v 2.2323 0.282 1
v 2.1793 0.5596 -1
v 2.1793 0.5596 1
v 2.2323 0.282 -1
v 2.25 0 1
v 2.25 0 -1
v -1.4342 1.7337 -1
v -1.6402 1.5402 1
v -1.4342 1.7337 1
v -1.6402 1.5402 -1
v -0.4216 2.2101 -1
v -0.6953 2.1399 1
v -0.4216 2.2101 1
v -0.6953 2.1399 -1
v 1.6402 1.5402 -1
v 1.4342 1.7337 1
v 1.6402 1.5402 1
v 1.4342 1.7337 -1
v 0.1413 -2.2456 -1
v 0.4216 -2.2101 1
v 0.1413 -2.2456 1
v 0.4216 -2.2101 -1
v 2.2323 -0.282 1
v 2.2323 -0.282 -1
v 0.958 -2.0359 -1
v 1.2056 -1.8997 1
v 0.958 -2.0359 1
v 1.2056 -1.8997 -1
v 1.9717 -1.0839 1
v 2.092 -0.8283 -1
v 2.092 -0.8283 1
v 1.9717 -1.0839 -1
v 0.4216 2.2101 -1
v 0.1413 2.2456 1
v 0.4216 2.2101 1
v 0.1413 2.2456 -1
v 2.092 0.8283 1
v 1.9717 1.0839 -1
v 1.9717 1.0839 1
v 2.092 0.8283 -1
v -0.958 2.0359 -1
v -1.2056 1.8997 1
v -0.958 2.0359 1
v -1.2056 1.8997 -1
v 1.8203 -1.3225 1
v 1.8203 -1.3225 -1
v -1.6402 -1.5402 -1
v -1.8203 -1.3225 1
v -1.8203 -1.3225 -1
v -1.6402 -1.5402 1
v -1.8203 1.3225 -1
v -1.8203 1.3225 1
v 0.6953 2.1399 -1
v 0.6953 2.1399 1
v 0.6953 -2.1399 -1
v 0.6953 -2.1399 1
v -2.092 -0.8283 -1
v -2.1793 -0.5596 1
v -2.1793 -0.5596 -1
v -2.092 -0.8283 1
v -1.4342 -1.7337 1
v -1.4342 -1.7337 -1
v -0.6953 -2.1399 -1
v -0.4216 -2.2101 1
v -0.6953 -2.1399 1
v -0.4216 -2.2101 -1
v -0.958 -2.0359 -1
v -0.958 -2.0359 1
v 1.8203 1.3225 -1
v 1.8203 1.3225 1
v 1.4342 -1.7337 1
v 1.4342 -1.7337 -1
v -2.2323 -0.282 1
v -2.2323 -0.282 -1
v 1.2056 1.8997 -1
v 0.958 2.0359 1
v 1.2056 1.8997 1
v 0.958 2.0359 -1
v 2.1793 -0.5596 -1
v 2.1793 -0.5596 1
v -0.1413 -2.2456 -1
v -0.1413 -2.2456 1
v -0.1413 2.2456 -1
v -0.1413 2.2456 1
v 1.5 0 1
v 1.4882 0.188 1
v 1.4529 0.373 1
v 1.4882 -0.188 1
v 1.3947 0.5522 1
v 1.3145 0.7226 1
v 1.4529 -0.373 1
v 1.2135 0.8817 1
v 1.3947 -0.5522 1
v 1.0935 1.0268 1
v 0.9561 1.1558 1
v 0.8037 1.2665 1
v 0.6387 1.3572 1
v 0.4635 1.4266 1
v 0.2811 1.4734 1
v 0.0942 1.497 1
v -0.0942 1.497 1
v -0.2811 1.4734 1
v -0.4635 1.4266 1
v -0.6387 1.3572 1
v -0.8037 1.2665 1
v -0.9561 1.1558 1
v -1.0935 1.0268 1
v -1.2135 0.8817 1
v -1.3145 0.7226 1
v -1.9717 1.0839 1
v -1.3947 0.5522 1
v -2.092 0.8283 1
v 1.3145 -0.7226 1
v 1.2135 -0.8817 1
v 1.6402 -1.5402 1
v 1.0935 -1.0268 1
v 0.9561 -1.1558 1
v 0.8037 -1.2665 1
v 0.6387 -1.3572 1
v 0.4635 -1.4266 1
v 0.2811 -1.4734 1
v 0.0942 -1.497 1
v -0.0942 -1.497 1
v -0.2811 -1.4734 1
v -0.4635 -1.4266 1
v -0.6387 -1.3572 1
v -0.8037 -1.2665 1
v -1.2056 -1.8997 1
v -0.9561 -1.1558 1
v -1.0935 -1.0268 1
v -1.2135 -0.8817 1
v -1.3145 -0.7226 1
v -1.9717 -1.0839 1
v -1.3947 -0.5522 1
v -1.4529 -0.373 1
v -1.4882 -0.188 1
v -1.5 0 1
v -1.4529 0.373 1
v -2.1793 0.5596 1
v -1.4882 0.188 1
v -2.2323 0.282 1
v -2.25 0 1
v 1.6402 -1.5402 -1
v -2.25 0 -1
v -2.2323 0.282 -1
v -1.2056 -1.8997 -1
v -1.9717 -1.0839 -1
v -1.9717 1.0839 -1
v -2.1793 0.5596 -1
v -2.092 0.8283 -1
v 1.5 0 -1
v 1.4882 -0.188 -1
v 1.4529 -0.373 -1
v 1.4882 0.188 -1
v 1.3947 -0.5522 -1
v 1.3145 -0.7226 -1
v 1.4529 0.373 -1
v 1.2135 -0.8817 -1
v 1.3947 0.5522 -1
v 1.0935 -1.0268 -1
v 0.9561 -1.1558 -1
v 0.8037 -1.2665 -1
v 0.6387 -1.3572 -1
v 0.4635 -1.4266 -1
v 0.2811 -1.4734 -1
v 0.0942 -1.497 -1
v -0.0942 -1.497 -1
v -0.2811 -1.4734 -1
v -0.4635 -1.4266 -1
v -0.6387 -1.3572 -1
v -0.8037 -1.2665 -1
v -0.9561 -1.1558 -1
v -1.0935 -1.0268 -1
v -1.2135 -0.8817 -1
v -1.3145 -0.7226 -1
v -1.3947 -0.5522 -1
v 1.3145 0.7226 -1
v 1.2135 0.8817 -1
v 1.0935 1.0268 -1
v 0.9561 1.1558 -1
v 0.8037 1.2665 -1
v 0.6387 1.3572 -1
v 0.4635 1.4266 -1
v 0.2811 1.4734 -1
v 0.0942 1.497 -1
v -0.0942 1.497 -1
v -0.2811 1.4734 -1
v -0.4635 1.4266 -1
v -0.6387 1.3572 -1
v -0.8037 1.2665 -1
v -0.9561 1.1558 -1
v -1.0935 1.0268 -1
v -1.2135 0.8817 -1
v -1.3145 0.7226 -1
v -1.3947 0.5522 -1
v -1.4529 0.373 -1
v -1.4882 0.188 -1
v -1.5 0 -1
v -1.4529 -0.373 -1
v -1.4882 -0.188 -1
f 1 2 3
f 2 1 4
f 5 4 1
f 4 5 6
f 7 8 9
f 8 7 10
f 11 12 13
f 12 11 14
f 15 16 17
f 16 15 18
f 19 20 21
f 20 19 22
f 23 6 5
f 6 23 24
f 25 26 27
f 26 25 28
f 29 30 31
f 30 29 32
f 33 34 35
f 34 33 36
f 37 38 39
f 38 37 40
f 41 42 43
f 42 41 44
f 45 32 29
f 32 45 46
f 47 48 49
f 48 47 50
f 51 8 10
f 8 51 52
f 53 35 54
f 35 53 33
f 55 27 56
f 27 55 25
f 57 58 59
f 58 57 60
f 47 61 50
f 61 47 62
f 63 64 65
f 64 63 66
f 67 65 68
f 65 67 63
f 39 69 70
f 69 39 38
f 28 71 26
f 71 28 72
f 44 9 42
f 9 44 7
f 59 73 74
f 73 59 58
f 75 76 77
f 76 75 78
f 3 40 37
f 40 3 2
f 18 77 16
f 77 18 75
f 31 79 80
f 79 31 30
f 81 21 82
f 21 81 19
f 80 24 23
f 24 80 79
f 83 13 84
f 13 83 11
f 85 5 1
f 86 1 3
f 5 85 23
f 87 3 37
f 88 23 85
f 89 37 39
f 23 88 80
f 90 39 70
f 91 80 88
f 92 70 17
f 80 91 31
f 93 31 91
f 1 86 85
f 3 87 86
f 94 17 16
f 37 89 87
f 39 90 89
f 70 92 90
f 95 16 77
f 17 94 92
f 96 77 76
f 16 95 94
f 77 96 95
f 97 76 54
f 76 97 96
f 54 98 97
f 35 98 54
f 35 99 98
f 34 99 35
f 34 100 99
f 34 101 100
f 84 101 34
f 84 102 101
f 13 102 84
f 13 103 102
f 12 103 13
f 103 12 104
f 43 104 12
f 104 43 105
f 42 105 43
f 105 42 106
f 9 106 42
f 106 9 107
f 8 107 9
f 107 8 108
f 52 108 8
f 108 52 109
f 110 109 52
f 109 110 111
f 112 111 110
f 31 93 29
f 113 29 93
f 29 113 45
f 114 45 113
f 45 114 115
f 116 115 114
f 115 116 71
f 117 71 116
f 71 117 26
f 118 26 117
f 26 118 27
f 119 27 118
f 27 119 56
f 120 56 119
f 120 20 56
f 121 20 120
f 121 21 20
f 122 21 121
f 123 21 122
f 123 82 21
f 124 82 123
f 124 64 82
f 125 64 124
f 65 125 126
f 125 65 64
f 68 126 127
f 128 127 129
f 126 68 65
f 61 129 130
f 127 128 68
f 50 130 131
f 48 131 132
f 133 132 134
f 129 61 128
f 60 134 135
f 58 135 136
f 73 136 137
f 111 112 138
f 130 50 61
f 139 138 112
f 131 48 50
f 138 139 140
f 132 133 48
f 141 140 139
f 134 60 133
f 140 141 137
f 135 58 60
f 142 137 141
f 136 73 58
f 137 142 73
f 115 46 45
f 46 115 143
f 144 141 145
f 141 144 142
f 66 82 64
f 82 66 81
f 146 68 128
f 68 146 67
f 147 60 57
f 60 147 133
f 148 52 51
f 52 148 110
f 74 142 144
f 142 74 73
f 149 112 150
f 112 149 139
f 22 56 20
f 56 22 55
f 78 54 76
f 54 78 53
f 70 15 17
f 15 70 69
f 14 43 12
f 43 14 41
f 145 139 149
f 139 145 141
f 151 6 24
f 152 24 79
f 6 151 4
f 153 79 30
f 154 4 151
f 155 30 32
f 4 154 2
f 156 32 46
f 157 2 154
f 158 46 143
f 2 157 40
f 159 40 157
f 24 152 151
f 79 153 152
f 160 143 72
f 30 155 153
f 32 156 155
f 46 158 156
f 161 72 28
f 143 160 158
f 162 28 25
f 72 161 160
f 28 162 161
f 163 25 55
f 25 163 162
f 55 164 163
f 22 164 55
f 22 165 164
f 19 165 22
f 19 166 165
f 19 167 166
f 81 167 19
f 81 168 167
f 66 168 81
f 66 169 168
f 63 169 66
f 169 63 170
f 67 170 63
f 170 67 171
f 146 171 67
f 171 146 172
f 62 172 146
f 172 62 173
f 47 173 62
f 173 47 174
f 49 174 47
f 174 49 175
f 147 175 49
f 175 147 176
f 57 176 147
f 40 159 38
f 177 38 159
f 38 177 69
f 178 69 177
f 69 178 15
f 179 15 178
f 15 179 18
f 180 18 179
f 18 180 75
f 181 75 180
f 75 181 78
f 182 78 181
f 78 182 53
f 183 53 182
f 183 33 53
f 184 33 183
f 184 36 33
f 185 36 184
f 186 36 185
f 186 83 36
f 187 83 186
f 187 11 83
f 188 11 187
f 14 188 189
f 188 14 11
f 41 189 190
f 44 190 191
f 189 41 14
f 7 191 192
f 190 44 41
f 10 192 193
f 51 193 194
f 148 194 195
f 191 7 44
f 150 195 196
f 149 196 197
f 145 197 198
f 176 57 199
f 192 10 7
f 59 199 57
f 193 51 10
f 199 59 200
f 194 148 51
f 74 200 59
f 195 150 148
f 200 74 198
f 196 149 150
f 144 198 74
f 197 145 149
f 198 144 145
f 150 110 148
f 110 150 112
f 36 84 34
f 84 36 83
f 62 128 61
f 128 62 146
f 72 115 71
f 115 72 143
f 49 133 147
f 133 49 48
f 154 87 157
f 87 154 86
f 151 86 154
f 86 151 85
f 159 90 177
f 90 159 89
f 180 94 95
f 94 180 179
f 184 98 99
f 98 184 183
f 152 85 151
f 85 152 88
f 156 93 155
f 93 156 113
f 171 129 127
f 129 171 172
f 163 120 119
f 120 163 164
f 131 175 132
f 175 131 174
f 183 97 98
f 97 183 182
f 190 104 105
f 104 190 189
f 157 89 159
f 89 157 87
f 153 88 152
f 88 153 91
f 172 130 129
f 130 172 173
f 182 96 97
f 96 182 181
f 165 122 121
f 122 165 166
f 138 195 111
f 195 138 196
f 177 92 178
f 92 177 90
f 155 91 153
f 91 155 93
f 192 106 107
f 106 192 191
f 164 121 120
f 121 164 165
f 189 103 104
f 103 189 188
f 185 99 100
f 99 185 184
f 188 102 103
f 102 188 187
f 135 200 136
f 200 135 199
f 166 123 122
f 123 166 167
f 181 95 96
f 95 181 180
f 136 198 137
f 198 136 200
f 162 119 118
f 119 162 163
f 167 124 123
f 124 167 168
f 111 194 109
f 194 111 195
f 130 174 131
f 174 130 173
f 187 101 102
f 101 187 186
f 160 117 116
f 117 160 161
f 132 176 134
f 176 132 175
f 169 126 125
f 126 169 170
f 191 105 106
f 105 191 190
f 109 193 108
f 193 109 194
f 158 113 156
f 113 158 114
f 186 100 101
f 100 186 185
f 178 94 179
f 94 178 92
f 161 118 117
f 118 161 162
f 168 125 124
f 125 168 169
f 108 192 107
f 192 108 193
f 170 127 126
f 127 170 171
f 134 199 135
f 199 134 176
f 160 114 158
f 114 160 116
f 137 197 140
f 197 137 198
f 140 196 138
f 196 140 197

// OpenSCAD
$fn = 50;


difference() {
	union() {
		translate(v = [0, 0, -1.0000000000]) {
			cylinder(h = 2, r = 2.2500000000);
		}
	}
	union() {
		translate(v = [0, 0, -100.0000000000]) {
			cylinder(h = 200, r = 1.5000000000);
		}
	}
}
